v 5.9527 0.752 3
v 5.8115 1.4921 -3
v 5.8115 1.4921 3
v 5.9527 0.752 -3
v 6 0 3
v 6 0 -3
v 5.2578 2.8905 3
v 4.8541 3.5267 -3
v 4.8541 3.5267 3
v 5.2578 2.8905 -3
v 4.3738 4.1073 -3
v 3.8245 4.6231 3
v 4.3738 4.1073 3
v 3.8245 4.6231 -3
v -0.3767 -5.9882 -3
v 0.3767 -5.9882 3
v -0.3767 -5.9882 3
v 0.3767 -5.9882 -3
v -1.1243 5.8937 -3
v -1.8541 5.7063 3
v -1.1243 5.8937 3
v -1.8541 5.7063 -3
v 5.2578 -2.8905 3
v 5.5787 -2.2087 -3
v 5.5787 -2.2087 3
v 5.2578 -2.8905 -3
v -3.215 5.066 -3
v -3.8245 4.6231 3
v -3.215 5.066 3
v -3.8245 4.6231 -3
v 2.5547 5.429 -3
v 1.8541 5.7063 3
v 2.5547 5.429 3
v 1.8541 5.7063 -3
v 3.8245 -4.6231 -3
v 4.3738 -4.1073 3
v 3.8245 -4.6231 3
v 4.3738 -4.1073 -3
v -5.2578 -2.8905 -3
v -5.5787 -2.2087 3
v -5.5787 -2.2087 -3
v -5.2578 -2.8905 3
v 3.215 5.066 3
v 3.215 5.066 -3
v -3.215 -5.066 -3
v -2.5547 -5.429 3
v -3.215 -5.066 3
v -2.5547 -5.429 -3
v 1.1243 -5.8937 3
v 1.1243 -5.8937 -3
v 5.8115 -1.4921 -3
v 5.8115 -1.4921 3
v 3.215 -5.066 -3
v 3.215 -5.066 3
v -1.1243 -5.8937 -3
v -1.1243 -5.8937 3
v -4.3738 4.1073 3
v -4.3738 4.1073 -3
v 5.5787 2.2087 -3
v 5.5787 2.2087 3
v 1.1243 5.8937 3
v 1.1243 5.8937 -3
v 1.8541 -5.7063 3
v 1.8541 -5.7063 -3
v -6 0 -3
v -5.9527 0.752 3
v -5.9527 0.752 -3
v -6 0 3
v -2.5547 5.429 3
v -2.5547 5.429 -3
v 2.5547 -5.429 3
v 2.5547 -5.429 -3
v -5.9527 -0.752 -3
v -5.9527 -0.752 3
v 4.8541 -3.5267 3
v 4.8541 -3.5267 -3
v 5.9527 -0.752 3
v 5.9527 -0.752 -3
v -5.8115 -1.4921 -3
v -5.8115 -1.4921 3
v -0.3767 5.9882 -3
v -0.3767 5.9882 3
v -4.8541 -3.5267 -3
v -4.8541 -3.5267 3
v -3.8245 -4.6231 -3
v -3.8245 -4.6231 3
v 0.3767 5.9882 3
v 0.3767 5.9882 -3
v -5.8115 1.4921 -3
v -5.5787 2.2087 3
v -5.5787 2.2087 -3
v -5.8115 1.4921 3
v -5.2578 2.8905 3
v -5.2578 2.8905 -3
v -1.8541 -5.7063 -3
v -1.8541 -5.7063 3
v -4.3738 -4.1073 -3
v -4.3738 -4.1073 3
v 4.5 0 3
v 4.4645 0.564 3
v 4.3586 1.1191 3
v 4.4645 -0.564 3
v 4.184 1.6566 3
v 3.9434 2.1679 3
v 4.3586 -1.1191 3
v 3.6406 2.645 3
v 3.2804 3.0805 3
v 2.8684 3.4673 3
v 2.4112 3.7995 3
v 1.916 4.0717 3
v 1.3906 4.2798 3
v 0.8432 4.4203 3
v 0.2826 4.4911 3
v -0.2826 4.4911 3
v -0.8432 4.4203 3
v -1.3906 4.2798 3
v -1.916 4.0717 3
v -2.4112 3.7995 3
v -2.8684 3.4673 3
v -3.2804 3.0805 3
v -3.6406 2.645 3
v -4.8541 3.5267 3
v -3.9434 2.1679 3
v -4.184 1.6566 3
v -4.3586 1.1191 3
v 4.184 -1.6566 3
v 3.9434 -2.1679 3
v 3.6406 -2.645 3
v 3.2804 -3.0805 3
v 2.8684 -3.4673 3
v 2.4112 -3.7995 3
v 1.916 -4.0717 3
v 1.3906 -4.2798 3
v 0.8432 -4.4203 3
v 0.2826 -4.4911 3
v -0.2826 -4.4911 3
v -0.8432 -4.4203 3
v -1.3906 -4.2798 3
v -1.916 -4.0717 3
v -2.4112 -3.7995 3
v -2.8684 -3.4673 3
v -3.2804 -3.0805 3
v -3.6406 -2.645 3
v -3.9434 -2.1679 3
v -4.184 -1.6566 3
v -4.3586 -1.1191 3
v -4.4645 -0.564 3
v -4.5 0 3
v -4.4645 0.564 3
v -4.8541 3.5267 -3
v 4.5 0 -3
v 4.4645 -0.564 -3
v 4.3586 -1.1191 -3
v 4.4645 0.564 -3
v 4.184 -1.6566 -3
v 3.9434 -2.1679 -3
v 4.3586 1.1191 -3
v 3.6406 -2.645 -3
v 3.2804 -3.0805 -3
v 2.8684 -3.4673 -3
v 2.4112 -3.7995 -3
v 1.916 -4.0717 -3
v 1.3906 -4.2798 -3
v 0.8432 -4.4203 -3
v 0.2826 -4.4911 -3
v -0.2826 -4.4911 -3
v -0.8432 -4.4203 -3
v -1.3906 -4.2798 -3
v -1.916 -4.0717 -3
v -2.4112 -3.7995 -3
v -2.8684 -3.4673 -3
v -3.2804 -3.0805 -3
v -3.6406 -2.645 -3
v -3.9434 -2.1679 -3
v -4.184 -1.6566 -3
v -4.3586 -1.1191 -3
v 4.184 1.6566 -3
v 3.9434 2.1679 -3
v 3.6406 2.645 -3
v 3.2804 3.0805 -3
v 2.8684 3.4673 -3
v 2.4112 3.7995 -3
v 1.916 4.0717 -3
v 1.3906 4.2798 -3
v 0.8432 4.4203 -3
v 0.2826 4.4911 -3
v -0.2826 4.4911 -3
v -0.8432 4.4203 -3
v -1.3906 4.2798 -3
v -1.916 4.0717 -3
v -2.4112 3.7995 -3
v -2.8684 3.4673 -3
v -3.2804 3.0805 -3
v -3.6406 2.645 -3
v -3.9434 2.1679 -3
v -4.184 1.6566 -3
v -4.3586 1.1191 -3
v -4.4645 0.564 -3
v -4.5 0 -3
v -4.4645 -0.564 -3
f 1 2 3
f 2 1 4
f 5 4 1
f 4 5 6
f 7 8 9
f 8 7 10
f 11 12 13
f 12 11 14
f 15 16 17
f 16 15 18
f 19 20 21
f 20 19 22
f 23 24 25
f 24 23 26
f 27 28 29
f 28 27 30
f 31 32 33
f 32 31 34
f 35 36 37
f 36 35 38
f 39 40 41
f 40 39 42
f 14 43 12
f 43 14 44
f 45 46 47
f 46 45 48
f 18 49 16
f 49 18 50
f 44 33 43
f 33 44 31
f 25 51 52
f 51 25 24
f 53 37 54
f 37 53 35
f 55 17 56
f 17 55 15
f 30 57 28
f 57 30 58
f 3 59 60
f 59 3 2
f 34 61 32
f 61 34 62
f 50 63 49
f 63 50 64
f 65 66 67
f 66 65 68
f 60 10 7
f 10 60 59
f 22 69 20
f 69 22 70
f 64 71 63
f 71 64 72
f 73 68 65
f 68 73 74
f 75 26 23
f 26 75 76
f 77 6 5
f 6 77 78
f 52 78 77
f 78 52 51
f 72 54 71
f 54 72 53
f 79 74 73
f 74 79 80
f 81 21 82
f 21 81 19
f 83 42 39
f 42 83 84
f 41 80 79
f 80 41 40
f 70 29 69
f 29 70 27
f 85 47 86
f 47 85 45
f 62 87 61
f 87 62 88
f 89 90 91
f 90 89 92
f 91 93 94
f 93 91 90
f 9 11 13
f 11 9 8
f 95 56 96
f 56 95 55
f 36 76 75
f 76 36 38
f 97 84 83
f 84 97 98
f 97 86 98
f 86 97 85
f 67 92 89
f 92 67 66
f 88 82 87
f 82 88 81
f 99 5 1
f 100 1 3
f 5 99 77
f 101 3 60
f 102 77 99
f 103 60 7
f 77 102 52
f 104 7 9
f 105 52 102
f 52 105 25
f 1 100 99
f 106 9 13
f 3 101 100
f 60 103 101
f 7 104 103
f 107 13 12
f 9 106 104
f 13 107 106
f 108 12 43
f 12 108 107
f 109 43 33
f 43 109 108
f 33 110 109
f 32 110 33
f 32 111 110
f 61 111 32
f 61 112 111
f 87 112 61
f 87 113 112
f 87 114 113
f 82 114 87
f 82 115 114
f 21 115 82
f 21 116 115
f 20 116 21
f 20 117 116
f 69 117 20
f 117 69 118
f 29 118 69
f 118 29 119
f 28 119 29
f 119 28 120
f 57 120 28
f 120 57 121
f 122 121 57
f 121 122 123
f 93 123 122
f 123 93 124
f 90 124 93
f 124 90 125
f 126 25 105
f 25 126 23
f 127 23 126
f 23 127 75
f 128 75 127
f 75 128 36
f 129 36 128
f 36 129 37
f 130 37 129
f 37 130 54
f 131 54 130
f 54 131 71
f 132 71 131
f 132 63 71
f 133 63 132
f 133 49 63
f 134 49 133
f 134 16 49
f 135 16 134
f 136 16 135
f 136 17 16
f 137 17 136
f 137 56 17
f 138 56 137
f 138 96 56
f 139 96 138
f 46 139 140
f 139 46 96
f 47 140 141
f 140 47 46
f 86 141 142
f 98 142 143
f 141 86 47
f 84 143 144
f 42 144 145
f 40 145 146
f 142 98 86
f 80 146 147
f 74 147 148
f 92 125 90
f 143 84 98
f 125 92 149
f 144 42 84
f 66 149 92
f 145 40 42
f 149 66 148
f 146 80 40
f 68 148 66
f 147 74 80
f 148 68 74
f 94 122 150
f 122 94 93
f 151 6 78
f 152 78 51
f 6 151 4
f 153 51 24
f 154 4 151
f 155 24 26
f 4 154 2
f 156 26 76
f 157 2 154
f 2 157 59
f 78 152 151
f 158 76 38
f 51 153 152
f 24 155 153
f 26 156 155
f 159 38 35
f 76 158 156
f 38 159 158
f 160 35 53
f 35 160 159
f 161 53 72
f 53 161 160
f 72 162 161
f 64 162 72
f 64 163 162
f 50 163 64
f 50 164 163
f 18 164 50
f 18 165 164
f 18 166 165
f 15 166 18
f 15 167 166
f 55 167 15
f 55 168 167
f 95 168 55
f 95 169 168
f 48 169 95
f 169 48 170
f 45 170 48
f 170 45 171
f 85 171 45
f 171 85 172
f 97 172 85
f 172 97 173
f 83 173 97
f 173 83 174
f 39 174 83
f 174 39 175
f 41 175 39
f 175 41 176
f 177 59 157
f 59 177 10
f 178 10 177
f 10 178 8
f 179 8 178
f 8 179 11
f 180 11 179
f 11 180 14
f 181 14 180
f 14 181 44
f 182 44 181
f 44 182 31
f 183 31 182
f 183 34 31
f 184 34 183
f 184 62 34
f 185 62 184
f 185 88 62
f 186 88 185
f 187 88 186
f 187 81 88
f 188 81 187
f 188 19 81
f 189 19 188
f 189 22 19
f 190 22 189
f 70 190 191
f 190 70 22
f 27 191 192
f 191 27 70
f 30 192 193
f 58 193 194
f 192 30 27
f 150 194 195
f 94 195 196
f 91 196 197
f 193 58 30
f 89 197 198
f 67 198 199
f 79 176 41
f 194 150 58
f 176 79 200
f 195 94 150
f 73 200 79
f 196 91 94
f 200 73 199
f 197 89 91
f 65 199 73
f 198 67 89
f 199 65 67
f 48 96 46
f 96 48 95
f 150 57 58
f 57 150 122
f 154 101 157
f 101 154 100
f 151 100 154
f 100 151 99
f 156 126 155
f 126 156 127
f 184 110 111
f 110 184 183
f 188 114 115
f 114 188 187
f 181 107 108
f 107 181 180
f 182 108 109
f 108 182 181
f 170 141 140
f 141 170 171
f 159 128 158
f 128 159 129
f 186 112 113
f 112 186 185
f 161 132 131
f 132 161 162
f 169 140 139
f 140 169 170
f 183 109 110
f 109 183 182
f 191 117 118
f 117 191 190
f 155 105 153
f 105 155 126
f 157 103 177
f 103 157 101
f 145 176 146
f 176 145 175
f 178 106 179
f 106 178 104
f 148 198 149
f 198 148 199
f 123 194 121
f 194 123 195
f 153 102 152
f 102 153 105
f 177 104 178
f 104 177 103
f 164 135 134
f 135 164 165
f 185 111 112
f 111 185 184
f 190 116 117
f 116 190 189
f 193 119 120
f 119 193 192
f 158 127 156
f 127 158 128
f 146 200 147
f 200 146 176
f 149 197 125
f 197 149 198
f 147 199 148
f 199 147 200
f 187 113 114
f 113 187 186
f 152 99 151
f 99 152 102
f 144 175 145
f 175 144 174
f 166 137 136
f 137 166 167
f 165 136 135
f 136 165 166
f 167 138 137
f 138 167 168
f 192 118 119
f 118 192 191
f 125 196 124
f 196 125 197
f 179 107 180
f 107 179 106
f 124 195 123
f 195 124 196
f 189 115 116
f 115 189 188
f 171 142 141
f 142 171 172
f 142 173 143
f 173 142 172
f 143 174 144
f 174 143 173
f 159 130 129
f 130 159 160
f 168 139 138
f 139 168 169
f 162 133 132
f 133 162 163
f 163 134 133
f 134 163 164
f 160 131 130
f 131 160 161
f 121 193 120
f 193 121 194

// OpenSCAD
$fn = 50;


difference() {
	union() {
		translate(v = [0, 0, -3.0000000000]) {
			cylinder(h = 6, r = 6.0000000000);
		}
	}
	union() {
		translate(v = [0, 0, -100.0000000000]) {
			cylinder(h = 200, r = 4.5000000000);
		}
	}
}
